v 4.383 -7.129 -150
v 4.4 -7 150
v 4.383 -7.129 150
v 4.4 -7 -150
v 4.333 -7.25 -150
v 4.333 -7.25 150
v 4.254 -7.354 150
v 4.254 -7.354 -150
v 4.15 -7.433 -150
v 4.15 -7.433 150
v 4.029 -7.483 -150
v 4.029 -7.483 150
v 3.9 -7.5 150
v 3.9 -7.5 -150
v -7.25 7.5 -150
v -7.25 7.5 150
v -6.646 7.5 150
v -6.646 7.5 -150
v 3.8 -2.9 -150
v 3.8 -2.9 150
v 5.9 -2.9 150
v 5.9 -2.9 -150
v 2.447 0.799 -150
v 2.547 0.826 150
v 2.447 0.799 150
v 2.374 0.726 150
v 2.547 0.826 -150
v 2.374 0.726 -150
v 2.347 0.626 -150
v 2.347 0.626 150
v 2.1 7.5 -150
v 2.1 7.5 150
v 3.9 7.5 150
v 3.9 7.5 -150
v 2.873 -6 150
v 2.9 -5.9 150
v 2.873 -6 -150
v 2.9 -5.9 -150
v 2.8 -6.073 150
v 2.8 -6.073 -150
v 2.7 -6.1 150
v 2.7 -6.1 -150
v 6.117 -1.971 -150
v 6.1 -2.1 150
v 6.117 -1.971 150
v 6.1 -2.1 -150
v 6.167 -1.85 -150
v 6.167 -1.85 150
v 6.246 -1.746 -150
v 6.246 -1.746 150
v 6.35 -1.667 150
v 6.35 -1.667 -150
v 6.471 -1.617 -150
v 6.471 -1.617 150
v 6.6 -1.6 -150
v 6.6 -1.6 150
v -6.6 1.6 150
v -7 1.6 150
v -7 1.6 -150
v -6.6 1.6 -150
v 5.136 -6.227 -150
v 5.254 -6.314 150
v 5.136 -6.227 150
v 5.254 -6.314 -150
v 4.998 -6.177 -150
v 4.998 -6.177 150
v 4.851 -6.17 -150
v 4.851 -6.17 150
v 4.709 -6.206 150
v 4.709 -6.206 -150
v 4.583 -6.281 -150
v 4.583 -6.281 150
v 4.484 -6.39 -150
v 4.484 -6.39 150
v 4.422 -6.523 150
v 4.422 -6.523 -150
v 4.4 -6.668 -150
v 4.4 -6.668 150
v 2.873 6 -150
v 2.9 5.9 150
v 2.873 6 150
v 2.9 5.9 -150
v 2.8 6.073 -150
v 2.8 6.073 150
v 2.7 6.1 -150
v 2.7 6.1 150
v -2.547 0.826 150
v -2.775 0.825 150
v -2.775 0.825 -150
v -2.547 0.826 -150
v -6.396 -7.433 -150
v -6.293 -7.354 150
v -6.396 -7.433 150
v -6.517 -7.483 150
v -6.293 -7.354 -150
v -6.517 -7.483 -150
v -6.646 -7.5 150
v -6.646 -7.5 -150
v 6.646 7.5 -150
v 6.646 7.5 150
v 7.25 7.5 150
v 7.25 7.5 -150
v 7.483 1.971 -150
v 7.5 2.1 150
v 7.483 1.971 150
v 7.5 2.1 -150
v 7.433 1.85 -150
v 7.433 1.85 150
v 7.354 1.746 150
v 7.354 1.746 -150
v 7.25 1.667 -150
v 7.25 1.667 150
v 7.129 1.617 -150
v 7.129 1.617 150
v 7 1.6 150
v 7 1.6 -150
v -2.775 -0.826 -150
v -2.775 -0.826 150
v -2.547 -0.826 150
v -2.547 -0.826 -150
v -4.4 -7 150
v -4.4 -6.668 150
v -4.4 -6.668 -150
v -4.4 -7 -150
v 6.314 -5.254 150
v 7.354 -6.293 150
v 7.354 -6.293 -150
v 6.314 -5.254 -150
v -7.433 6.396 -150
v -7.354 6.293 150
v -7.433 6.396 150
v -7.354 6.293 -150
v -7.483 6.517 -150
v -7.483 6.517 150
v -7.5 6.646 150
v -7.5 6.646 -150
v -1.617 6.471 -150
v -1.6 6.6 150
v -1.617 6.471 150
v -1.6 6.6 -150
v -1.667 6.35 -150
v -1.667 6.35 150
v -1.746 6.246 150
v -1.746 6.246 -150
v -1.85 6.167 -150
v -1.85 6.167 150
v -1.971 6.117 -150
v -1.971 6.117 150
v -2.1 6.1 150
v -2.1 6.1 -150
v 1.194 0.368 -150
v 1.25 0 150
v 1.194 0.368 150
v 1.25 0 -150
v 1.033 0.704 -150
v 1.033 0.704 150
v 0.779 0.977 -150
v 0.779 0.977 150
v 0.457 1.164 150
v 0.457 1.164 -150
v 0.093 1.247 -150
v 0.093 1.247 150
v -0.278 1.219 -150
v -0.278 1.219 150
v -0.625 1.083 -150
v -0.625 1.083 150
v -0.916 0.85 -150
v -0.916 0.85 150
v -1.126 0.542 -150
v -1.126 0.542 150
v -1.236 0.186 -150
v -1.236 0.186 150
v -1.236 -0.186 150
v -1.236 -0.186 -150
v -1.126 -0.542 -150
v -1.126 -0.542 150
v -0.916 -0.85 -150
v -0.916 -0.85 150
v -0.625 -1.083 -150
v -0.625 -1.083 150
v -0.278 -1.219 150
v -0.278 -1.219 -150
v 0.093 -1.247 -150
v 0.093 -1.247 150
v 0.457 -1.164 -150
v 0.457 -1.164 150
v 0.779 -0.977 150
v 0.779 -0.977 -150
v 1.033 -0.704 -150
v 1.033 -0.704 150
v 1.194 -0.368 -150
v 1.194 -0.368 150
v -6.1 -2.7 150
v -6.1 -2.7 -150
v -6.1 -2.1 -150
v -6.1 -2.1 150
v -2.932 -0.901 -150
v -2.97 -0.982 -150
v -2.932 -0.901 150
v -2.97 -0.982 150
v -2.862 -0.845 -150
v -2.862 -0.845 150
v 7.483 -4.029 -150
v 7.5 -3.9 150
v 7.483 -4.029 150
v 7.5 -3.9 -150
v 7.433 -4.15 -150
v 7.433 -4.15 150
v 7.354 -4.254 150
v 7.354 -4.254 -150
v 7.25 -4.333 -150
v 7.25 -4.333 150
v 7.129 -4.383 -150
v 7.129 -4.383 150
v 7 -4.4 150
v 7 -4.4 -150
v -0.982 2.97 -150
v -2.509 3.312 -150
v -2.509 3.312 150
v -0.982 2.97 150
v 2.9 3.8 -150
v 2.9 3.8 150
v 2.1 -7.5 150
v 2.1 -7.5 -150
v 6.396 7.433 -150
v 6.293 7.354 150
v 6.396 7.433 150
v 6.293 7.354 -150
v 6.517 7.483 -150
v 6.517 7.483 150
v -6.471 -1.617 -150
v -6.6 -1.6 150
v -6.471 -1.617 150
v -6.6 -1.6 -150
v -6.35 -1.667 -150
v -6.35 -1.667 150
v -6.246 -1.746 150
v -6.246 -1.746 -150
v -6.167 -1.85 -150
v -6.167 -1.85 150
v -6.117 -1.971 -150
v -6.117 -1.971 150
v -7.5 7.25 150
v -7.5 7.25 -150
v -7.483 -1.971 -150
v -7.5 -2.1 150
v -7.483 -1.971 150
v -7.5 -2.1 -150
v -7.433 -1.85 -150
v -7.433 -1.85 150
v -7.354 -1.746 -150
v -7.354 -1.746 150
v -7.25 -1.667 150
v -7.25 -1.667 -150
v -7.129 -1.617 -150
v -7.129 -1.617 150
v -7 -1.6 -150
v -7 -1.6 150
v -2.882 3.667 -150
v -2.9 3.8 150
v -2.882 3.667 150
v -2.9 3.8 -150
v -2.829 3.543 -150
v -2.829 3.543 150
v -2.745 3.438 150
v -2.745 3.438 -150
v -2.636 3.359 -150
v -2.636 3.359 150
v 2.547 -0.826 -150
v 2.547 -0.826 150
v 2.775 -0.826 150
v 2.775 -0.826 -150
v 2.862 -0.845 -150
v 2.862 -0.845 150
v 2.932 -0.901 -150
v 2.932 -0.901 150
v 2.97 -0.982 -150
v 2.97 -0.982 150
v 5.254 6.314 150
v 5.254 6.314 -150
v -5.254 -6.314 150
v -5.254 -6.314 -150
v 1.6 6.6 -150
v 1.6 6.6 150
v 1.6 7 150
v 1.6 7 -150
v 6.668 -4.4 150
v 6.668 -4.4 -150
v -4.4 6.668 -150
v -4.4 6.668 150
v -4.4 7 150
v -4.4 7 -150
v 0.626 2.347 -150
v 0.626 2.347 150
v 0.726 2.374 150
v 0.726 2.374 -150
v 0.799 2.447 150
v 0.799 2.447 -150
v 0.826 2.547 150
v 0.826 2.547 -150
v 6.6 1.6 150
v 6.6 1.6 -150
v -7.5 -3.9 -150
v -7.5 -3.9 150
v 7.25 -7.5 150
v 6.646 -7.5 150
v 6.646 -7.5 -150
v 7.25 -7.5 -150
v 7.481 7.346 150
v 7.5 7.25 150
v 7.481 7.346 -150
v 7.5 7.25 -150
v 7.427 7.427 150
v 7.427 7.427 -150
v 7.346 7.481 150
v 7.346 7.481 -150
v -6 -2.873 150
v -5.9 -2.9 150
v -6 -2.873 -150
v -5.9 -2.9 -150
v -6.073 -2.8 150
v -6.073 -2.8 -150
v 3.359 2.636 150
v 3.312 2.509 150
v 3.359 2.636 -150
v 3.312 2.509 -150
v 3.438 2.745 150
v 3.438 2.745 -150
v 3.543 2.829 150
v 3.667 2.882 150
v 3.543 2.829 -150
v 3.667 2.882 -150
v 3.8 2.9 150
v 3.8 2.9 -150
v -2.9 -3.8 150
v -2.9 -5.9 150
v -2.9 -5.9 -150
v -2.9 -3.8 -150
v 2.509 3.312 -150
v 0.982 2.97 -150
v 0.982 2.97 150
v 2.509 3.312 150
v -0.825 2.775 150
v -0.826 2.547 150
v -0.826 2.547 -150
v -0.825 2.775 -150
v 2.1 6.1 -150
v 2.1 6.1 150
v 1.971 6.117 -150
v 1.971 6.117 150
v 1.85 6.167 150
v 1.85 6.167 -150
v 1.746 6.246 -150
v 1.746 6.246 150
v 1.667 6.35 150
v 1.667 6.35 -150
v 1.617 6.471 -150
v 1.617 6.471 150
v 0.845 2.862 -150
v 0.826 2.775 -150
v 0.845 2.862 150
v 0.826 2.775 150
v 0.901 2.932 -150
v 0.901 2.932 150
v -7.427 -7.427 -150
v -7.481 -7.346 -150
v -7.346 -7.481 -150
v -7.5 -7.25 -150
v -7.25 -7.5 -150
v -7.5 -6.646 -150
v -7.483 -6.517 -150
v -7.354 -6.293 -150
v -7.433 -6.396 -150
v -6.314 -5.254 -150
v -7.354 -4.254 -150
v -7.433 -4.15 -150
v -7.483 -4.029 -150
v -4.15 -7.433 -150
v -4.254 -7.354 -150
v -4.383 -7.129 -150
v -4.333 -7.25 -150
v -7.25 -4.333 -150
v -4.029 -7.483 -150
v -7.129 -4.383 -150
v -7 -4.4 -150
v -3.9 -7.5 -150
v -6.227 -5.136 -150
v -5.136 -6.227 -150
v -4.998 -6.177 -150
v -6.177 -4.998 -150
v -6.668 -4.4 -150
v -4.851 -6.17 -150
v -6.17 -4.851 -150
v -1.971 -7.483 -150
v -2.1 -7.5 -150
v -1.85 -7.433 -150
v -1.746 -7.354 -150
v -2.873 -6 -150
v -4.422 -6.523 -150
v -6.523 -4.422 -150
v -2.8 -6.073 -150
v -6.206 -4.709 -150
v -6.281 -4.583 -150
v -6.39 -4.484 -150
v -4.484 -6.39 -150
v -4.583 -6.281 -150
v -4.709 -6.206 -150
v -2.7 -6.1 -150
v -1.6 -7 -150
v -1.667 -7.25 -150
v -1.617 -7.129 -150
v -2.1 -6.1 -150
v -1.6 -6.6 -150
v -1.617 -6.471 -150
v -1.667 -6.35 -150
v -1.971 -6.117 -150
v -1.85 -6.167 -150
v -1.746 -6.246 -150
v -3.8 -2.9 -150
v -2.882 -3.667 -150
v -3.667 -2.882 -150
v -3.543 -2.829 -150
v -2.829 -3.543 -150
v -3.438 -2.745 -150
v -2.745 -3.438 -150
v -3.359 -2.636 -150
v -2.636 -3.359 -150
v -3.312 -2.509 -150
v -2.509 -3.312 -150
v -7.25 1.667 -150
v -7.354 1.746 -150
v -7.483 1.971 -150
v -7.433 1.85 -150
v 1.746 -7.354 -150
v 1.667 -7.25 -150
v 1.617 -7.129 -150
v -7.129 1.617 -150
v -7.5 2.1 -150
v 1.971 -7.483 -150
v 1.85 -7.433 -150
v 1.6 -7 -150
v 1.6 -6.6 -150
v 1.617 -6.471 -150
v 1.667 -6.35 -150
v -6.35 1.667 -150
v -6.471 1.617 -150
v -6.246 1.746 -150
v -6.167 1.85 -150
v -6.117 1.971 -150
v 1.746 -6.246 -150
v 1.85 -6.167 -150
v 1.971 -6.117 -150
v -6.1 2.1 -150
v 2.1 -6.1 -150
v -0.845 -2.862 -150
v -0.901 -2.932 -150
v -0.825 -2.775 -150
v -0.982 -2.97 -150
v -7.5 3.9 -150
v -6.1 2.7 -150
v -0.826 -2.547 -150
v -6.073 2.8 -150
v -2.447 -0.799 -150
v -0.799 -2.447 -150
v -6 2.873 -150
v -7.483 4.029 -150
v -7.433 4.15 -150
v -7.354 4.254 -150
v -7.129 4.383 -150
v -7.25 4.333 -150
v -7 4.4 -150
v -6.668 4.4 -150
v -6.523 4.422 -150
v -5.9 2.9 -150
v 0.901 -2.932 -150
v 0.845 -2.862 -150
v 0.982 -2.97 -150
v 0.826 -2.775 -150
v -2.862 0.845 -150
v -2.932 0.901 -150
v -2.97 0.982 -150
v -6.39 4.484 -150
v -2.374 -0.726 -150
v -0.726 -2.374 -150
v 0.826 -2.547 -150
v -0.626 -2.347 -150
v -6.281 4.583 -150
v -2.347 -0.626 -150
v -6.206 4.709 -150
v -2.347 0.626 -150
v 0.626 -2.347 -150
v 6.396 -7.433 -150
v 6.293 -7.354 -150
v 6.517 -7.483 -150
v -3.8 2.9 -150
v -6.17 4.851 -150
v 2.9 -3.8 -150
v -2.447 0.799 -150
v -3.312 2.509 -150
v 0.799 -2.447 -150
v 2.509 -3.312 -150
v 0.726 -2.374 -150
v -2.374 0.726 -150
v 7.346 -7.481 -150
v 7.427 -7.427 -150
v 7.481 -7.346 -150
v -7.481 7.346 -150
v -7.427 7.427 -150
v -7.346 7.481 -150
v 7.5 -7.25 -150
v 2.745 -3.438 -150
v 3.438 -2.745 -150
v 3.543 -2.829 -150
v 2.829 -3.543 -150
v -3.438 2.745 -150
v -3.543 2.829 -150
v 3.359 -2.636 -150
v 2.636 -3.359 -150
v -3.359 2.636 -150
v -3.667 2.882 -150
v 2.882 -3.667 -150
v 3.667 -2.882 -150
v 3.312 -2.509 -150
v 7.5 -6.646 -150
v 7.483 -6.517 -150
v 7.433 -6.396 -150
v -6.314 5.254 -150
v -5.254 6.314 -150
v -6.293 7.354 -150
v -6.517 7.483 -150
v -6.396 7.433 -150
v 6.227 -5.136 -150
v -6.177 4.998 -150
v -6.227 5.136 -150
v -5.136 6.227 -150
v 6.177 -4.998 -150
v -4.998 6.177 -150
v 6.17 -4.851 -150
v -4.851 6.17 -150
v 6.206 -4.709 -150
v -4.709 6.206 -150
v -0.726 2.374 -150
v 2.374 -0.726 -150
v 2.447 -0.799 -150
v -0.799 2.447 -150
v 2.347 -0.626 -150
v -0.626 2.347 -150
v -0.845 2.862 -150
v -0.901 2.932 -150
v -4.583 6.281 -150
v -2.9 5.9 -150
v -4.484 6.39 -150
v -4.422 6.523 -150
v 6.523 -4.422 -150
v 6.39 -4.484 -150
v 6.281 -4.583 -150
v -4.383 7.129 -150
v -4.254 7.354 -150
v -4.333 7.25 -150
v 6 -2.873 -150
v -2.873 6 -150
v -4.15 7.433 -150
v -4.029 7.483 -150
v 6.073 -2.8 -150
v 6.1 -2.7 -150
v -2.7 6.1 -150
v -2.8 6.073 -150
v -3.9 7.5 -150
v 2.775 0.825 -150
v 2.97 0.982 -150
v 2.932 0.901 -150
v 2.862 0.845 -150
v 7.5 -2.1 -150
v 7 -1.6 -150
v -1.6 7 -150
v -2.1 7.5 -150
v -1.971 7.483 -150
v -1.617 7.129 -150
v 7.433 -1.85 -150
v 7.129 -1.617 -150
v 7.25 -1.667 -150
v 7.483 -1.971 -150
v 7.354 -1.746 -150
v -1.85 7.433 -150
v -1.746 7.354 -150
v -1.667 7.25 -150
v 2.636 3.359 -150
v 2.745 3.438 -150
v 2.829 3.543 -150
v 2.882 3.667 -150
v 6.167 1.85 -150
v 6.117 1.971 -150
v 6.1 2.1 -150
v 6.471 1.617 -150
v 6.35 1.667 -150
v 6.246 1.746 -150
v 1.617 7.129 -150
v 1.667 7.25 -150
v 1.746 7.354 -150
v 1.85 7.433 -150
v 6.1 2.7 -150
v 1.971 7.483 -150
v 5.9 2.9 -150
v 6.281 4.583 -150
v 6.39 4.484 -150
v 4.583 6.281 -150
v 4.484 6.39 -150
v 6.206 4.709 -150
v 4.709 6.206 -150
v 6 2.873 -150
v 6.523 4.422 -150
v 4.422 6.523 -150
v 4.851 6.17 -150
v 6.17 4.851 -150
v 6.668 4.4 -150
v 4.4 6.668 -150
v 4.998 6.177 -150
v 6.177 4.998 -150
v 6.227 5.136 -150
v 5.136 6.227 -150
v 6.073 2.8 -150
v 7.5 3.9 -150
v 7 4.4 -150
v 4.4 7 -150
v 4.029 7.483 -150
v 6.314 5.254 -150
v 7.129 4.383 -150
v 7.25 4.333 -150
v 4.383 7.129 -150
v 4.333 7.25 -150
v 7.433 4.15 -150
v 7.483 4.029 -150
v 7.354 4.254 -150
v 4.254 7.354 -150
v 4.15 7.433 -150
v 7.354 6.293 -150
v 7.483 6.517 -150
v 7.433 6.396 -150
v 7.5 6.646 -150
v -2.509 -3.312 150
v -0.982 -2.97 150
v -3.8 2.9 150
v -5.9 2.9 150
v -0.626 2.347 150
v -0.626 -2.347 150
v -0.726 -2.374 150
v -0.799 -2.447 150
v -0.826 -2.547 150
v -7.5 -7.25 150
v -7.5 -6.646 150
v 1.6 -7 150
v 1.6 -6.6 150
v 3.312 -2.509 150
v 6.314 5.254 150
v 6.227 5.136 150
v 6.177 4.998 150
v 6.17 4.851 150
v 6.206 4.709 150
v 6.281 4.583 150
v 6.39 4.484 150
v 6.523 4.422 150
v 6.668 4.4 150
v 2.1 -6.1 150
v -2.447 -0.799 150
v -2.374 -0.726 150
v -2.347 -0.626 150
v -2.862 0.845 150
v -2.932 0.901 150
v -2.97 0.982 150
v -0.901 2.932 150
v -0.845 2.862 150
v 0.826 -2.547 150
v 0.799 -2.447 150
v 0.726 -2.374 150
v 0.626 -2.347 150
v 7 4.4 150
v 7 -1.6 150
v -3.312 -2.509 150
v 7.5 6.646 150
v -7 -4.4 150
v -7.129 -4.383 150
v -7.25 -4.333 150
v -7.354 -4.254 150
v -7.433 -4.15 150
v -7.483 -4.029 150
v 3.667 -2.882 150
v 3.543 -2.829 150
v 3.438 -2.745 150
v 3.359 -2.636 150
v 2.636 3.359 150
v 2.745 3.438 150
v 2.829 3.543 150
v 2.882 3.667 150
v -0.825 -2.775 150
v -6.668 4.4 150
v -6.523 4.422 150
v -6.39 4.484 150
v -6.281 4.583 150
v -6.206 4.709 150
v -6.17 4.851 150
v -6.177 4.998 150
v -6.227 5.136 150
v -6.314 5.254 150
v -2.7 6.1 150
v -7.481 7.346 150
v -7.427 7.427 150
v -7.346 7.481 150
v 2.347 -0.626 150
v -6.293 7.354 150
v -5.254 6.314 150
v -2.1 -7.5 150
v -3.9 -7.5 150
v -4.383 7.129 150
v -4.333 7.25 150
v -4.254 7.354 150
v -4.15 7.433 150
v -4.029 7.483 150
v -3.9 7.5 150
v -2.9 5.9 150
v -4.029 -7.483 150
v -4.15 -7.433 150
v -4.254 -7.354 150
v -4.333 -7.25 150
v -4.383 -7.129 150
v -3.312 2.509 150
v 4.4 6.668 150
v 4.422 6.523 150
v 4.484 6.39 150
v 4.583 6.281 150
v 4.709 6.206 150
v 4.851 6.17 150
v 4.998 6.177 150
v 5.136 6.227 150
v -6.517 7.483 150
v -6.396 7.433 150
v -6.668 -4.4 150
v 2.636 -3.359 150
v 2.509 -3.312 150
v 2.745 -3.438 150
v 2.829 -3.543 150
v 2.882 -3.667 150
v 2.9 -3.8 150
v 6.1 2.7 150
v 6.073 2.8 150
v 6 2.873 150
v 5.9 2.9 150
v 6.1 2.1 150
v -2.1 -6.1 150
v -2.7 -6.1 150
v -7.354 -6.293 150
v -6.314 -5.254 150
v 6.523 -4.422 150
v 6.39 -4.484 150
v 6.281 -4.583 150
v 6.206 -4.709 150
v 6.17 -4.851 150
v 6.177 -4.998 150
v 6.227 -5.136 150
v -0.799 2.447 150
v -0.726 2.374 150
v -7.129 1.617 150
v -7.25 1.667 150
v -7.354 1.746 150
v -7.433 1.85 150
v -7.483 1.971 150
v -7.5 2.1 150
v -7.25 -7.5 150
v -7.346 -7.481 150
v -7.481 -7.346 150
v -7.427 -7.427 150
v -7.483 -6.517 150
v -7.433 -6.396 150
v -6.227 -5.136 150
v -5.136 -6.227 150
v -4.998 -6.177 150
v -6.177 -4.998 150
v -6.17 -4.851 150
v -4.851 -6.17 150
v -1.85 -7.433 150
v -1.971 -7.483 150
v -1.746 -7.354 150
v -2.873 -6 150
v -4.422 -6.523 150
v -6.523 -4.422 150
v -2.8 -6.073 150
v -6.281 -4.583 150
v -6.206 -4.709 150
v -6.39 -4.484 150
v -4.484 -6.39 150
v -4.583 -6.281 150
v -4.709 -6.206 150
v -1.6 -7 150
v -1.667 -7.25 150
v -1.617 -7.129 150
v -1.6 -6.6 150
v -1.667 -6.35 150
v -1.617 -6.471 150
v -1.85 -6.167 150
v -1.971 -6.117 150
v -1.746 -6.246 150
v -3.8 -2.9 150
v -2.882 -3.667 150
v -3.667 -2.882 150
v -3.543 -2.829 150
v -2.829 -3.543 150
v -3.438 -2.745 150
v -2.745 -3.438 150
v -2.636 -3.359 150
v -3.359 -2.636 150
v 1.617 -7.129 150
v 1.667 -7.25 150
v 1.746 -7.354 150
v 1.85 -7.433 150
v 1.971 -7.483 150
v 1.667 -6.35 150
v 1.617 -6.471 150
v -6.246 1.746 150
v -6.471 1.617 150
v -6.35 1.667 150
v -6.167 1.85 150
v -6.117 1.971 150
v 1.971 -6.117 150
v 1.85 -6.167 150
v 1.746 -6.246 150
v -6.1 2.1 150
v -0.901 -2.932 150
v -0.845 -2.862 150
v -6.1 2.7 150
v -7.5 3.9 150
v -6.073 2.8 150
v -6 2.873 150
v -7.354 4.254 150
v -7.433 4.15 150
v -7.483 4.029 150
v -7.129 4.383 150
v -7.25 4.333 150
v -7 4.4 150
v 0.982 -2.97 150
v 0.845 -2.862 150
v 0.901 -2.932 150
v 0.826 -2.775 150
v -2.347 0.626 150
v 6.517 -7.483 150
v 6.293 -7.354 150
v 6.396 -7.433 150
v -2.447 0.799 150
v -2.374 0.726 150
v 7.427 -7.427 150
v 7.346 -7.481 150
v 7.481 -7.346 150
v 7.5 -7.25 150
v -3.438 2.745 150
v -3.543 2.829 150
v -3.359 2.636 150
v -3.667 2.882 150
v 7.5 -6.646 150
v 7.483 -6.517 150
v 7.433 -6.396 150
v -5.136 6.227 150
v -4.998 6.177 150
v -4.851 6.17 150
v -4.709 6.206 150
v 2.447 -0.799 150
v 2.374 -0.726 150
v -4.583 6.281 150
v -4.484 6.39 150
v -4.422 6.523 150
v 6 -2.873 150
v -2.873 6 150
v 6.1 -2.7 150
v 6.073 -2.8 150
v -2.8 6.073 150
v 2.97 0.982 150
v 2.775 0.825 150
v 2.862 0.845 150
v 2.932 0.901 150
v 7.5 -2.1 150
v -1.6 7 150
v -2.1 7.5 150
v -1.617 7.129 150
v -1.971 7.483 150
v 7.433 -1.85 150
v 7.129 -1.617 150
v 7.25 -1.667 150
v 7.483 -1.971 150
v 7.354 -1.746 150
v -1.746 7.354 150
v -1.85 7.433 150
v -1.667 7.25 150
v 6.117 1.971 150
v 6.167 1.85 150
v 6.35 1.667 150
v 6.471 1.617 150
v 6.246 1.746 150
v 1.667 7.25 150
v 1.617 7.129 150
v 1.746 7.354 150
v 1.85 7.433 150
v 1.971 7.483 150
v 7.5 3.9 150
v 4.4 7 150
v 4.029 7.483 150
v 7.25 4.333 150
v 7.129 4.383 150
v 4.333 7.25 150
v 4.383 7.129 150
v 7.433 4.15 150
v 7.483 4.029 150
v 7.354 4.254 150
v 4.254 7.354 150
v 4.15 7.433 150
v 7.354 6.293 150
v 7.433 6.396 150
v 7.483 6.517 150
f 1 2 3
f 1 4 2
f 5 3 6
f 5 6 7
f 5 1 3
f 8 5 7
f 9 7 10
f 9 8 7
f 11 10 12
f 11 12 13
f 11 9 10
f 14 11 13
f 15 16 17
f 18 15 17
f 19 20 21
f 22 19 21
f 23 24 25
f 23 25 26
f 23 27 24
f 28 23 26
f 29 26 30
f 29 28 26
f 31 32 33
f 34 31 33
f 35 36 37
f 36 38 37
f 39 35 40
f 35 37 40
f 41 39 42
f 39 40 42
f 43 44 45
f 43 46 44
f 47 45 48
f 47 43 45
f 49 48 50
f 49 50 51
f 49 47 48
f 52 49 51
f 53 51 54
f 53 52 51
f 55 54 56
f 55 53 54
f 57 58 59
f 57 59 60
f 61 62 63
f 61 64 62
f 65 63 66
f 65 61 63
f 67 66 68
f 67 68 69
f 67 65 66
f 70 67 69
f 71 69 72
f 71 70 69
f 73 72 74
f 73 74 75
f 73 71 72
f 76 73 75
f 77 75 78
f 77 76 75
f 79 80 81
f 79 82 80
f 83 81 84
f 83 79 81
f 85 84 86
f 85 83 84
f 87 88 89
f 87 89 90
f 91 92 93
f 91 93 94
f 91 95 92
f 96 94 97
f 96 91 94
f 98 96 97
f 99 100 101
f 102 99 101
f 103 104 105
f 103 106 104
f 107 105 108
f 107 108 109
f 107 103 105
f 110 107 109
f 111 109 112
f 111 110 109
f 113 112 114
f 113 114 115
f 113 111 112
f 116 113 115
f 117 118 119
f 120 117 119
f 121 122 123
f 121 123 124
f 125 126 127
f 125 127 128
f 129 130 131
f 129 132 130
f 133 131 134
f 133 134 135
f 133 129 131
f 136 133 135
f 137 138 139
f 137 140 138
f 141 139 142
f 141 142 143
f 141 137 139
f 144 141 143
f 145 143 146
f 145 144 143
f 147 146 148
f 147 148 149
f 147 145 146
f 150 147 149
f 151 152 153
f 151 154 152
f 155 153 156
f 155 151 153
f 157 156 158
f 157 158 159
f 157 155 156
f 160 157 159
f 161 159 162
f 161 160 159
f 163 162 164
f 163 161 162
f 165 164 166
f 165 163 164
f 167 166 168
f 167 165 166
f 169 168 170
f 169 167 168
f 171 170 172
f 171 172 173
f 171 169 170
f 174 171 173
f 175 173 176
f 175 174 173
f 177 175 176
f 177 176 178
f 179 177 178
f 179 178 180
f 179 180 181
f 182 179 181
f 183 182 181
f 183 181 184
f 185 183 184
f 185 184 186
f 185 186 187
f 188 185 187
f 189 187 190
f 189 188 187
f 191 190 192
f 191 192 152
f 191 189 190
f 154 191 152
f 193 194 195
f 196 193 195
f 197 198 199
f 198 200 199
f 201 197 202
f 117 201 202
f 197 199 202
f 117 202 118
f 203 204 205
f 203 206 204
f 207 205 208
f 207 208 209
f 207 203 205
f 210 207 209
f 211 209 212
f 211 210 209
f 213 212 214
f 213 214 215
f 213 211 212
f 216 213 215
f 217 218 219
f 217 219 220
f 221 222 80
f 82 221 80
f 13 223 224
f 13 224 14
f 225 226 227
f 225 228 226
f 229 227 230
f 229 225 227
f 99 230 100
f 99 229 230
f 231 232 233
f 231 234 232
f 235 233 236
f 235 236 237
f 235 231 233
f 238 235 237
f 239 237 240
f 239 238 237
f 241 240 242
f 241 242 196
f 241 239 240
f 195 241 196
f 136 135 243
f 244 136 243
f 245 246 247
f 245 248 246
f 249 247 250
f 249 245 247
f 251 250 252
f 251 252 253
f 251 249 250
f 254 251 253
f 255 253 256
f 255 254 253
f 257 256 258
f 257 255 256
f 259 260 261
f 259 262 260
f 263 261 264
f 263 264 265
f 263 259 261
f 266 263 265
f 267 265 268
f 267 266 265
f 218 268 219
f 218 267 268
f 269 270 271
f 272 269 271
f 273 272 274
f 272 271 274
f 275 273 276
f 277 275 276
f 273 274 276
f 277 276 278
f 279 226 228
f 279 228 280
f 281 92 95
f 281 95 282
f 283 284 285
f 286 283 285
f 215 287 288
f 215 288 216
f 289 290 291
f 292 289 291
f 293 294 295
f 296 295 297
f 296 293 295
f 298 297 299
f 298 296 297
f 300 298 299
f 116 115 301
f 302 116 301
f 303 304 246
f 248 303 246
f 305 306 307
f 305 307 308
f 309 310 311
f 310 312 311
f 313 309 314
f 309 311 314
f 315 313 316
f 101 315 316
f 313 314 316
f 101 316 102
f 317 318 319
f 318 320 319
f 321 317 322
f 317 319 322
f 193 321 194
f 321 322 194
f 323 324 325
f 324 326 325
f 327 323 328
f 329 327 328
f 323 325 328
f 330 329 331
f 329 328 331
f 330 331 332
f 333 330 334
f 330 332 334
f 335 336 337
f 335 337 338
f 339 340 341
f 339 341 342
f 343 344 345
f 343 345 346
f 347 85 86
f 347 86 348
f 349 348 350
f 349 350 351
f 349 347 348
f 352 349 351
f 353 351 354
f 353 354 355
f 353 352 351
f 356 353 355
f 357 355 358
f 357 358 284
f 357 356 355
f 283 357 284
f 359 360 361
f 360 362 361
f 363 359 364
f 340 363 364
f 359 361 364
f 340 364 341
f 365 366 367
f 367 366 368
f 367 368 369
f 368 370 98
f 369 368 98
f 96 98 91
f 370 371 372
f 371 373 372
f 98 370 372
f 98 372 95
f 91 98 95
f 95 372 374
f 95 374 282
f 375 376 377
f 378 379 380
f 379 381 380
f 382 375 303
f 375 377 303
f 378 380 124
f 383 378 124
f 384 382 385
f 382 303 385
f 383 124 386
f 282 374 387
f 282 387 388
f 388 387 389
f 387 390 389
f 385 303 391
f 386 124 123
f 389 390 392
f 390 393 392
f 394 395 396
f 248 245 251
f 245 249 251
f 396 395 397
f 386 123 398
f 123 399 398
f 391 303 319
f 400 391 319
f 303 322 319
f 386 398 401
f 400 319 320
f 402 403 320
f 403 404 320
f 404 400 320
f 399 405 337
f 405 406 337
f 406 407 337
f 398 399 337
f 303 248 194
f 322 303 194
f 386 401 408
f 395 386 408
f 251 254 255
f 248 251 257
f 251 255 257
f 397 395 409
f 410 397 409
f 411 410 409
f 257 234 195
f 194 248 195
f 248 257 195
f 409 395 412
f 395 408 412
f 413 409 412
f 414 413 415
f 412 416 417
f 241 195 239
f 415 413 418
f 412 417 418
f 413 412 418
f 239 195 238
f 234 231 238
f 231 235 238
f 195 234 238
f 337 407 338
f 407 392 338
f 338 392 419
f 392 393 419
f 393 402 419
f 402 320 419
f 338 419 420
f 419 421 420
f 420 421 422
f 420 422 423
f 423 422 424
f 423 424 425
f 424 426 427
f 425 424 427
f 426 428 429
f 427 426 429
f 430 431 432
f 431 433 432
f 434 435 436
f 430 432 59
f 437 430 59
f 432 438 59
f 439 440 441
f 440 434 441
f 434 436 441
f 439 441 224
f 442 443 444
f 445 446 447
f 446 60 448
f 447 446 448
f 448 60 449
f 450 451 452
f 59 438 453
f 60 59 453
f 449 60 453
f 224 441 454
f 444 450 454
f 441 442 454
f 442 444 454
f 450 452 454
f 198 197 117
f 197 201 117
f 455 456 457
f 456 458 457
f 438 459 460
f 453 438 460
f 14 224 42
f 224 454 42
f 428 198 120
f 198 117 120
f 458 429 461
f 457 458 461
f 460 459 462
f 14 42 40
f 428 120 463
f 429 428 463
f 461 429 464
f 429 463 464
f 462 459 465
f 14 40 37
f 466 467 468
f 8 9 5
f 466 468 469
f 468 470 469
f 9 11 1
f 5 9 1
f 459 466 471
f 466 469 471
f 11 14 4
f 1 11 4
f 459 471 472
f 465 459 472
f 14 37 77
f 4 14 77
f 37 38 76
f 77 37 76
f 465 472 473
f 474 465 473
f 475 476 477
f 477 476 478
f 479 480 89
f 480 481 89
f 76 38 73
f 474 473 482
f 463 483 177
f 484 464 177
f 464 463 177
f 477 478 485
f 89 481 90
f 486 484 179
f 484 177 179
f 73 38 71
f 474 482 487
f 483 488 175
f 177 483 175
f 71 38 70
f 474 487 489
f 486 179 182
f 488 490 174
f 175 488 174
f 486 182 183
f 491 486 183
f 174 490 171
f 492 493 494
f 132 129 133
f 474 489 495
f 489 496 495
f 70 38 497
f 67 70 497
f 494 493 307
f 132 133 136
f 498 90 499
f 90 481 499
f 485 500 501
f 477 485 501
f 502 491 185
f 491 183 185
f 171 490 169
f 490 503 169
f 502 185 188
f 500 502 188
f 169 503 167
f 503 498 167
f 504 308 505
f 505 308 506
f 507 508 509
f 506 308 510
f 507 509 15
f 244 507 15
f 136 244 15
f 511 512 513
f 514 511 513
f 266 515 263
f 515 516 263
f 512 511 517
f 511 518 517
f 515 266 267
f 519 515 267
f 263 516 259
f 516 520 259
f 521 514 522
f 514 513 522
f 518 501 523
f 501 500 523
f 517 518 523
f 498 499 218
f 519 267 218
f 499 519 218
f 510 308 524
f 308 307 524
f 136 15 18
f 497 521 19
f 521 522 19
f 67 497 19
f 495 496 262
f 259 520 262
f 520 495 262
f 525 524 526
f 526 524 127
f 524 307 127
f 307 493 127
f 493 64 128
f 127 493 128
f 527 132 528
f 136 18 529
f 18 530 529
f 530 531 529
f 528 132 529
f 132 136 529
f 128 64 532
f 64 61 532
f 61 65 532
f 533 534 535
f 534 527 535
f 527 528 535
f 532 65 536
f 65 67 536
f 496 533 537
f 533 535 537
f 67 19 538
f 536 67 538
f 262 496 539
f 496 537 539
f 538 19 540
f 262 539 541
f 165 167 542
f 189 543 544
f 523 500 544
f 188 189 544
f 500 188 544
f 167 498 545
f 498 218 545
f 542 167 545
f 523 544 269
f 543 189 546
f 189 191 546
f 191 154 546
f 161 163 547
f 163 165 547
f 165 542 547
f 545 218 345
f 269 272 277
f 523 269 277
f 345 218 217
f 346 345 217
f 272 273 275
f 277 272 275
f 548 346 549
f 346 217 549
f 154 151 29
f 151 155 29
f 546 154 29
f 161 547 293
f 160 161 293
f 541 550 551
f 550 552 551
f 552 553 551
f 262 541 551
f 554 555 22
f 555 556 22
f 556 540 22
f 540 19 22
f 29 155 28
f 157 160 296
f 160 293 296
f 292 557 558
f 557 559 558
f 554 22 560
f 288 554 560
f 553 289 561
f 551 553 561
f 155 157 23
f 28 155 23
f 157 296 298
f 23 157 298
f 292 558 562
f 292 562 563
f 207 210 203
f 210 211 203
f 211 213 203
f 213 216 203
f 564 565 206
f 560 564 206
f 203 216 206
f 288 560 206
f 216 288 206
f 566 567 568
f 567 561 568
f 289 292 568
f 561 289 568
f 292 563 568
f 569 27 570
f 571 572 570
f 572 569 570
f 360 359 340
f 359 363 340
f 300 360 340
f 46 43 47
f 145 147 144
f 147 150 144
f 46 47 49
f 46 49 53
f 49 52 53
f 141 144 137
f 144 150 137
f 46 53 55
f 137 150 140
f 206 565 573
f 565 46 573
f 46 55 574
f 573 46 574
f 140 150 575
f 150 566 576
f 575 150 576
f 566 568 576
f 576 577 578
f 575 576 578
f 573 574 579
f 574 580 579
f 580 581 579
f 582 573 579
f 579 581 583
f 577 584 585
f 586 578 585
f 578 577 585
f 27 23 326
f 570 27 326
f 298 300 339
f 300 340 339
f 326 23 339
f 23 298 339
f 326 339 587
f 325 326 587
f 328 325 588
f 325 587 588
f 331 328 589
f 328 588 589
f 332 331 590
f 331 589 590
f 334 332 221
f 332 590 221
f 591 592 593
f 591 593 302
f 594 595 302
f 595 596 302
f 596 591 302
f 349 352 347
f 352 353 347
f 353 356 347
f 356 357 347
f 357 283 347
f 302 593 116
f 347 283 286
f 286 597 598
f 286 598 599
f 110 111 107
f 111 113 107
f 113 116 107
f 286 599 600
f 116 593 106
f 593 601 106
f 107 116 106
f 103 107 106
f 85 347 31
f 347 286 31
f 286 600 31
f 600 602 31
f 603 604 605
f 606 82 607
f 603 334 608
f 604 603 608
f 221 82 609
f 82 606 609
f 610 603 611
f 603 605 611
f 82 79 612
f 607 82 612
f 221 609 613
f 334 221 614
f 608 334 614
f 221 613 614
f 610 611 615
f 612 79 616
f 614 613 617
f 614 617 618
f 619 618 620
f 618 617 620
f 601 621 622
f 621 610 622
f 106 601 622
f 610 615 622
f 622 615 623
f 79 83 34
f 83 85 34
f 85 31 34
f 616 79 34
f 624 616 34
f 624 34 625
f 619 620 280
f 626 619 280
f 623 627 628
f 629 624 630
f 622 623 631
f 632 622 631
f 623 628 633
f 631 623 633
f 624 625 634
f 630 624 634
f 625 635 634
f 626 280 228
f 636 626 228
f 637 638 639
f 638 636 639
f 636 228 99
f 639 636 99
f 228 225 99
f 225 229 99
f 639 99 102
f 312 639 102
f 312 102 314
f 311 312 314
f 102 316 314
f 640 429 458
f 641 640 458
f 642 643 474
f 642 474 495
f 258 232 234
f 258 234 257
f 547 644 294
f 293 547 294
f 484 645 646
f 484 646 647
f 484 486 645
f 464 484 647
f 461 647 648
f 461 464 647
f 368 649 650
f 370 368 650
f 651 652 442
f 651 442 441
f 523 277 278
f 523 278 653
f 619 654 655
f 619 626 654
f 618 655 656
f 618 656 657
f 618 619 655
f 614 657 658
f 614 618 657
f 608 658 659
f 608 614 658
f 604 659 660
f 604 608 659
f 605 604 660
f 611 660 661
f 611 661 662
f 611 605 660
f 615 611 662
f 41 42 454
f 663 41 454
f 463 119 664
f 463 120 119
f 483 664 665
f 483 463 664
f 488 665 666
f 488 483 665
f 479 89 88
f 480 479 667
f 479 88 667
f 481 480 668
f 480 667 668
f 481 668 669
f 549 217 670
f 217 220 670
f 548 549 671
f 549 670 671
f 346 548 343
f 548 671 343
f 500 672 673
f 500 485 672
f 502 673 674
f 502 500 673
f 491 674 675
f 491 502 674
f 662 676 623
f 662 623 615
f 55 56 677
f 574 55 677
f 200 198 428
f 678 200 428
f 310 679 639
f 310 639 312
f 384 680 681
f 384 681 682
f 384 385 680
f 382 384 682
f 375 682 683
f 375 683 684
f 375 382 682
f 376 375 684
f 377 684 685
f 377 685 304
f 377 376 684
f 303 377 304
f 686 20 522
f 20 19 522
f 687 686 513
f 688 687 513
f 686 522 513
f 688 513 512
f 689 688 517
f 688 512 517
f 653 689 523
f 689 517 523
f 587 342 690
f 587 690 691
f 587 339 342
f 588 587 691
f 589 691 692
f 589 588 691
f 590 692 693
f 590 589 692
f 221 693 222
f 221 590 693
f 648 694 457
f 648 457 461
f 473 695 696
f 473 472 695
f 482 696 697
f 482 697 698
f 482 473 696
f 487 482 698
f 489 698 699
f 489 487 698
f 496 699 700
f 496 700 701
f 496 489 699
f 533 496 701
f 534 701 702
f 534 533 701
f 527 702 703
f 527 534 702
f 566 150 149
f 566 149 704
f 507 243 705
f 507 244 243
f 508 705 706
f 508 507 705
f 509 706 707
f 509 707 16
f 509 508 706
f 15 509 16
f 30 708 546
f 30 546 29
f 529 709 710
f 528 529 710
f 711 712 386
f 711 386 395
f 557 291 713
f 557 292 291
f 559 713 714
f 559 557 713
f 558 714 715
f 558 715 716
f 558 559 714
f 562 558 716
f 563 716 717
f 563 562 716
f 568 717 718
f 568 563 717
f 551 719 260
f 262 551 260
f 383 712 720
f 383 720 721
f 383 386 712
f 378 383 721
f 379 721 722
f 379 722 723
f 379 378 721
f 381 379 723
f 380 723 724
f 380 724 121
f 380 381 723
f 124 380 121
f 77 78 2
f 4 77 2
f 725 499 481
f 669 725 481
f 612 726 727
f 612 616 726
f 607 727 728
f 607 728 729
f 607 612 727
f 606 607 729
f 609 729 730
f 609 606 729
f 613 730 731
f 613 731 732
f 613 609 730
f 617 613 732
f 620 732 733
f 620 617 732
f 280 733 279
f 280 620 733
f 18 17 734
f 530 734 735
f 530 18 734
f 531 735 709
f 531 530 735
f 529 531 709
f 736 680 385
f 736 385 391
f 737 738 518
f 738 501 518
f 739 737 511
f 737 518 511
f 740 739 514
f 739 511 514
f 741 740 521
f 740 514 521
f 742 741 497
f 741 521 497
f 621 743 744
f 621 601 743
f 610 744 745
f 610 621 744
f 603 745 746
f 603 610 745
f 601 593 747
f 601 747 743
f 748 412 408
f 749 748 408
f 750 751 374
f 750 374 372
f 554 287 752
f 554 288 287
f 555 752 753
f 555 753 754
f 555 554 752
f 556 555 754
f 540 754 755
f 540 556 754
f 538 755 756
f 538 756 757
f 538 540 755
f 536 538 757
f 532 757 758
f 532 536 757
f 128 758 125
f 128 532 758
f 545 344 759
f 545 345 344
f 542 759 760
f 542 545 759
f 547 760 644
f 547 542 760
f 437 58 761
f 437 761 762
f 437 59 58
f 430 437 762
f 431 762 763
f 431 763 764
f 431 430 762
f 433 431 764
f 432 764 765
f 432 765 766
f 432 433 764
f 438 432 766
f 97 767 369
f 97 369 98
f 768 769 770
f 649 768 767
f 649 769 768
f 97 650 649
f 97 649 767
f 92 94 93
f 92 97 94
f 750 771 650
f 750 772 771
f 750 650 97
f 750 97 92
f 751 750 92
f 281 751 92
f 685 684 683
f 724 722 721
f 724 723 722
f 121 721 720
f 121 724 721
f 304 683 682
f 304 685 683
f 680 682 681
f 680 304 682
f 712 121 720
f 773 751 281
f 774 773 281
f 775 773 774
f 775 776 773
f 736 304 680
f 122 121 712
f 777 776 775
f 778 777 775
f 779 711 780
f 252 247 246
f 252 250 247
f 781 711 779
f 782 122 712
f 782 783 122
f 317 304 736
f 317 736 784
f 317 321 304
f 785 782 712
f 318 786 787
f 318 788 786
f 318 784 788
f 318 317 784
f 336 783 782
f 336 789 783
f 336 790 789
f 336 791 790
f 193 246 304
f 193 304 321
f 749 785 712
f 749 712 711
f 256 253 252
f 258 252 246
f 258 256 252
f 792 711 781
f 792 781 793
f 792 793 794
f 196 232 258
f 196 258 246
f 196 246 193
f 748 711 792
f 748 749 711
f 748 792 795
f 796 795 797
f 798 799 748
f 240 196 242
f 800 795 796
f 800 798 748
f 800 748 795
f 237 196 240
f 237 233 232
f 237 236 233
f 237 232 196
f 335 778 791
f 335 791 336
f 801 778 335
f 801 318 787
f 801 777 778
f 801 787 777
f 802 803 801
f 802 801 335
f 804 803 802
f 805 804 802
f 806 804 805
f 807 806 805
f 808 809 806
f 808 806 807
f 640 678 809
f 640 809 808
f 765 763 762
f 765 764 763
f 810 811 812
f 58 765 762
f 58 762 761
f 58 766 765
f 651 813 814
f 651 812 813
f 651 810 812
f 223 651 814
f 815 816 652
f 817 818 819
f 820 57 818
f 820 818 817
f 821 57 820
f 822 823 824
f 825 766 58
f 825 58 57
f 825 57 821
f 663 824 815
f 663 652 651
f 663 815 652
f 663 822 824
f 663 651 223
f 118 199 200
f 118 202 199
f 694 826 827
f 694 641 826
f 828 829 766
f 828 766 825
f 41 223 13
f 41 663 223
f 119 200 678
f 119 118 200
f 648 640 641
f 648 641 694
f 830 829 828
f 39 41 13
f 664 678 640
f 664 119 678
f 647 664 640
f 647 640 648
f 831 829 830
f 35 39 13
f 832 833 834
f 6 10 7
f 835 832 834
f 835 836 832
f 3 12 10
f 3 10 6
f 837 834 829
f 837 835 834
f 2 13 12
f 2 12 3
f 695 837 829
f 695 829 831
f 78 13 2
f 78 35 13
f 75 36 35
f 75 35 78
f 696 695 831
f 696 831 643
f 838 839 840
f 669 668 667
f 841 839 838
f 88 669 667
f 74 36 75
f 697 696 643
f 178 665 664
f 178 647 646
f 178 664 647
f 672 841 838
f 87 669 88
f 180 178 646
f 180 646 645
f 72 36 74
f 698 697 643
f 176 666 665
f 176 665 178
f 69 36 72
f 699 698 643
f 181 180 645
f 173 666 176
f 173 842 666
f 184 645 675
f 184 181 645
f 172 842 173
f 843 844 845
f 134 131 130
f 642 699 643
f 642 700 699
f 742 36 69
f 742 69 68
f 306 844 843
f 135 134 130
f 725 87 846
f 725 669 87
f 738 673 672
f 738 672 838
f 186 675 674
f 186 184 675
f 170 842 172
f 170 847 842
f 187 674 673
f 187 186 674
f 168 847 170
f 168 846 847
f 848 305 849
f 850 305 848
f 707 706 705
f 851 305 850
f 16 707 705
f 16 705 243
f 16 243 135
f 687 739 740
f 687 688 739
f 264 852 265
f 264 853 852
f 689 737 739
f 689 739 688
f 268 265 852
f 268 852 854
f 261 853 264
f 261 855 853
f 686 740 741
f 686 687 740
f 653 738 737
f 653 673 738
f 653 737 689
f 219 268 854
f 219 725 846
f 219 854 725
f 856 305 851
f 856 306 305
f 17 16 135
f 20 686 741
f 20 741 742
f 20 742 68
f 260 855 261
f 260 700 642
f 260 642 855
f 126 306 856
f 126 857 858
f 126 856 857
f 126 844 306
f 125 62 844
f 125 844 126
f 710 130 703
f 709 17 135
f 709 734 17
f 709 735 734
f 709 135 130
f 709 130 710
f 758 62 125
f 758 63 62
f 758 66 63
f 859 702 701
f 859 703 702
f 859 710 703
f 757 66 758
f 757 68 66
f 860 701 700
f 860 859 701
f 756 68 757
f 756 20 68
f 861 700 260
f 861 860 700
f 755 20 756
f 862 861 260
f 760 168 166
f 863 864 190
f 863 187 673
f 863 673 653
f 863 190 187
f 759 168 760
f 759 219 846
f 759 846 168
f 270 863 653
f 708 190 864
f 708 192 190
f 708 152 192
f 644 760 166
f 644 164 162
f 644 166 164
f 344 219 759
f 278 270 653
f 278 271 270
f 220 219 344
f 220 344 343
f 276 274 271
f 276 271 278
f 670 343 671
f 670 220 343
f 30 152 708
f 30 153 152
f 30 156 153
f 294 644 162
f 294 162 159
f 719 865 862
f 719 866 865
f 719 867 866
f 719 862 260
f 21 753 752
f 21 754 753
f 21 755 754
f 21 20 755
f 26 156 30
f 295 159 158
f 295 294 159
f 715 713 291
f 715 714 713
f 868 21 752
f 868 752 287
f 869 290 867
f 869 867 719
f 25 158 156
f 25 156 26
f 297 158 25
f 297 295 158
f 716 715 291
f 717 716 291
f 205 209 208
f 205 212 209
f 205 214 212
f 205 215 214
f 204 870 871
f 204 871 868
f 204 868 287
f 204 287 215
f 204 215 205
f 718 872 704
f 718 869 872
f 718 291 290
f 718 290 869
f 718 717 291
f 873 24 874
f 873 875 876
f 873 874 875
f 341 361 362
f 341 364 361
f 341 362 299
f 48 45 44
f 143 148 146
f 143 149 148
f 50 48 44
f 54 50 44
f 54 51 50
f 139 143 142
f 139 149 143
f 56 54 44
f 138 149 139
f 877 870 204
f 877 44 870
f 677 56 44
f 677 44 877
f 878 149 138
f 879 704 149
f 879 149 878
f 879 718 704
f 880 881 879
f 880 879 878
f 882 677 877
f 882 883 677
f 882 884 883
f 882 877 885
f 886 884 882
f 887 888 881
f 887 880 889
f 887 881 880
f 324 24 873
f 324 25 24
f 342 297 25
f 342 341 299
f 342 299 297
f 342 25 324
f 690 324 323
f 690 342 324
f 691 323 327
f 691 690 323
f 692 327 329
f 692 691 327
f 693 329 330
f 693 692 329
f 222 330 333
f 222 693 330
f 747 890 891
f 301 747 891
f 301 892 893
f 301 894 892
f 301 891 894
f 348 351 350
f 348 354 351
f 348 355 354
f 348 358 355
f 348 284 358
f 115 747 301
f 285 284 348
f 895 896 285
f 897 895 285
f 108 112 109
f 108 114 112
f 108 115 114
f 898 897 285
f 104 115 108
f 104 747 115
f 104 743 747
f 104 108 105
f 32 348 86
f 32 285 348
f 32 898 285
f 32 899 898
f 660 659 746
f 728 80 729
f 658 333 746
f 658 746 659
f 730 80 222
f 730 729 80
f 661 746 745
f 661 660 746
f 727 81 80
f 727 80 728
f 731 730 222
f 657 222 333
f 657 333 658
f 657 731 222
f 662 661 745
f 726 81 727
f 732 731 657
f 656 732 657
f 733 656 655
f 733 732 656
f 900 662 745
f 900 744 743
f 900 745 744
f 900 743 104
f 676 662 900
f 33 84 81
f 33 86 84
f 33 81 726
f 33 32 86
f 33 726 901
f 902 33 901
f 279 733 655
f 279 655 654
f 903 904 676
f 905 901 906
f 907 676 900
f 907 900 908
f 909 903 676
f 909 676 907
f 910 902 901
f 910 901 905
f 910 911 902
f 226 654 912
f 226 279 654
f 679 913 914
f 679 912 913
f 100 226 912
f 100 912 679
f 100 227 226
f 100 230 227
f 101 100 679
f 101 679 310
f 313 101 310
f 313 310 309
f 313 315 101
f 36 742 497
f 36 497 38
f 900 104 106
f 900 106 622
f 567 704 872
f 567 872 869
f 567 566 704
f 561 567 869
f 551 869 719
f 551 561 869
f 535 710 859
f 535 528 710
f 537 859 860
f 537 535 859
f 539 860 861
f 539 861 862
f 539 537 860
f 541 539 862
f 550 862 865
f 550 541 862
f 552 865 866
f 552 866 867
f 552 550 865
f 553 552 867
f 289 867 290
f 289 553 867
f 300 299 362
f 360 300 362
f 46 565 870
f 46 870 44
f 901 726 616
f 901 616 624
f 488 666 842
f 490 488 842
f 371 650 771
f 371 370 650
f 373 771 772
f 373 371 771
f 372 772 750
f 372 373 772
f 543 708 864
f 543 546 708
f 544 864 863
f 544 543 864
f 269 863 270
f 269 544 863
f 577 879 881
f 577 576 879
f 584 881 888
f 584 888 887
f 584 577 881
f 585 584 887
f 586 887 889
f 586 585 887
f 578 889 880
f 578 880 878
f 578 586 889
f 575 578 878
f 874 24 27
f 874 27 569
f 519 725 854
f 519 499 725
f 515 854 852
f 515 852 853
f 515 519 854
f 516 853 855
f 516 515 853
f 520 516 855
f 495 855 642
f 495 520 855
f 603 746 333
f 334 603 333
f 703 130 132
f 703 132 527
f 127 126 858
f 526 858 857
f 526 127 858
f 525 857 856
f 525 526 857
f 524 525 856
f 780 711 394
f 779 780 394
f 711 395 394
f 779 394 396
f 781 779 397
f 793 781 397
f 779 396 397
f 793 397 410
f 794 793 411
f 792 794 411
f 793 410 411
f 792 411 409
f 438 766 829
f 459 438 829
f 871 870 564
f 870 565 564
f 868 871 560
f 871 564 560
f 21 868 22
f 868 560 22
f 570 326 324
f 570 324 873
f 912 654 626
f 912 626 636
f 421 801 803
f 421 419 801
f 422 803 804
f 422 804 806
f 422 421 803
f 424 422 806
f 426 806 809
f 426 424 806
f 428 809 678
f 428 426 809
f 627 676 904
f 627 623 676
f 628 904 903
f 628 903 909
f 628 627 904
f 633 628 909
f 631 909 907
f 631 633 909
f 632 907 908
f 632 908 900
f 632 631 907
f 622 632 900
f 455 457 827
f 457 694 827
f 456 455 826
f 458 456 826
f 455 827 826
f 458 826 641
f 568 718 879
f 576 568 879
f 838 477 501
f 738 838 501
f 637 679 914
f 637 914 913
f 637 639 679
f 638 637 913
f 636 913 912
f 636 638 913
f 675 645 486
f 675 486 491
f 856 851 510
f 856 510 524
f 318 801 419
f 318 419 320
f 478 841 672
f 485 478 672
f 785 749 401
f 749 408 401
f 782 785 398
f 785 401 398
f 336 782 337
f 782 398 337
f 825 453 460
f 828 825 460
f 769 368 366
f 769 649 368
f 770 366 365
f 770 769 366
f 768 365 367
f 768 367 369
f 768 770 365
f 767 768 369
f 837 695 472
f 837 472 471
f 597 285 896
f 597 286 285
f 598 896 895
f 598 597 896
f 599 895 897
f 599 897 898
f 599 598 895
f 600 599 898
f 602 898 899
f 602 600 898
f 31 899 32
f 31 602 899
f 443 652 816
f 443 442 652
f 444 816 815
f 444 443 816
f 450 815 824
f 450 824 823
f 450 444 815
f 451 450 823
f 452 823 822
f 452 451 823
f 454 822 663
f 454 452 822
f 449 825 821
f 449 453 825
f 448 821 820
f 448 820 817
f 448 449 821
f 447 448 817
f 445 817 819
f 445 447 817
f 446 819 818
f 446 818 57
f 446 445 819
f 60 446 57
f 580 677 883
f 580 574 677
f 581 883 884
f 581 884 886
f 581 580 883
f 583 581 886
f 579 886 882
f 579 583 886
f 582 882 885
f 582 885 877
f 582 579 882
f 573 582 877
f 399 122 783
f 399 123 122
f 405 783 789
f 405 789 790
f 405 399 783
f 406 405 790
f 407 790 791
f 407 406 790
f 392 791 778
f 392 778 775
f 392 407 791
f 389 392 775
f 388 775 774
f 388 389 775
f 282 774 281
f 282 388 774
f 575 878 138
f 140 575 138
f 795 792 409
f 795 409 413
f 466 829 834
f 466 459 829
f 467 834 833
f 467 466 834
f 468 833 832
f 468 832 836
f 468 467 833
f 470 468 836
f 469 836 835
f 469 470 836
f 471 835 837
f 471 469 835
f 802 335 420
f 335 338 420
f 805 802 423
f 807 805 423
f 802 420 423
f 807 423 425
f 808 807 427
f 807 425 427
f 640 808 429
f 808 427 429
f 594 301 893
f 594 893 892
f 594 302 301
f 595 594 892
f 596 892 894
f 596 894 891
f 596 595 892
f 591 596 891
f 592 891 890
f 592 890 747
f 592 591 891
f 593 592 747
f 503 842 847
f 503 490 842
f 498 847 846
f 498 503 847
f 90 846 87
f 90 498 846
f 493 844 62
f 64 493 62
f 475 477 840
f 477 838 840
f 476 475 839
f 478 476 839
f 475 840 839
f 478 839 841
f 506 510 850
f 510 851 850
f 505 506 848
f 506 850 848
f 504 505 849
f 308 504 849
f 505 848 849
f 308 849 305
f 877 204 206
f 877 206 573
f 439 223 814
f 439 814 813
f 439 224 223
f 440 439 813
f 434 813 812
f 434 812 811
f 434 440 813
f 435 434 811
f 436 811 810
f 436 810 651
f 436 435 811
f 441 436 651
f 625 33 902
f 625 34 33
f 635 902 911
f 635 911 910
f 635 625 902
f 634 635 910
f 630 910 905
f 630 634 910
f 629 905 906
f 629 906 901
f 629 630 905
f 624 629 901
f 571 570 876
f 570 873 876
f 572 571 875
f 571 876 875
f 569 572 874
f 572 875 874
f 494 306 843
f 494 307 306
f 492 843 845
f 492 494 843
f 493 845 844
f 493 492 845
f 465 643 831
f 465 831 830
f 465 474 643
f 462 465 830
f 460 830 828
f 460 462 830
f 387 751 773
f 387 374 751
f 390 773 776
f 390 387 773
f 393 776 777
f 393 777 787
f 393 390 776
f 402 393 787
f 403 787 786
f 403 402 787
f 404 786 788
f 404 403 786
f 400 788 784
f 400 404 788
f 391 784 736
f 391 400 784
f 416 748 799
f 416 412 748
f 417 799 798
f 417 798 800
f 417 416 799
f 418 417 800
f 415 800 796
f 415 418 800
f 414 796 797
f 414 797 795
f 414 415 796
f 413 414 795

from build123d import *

# Parameters (mm, degrees)
SKETCH1_W           = 15
SKETCH1_H           = 15
SKETCH1_R           = 1.25
CHANGE_LENGTH_DEPTH = 150
FILLET1_R           = 0.25
CUT_EXTRUDE1_DEPTH  = 301.187441443
CUT_EXTRUDE3_DEPTH  = 301.187441443
FILLET3_R           = 0.5
FILLET4_R           = 0.5
FILLET5_R           = 3
FILLET6_R           = 0.2
CUT_EXTRUDE4_DEPTH  = 301.187441443
FILLET8_R           = 0.5
SKETCH6_W           = 5.1529354
SKETCH6_H           = 1.651
SKETCH6_W_2         = 1.651
SKETCH6_H_2         = 5.1529354
CUT_EXTRUDE5_DEPTH  = 301.187441443
FILLET10_R          = 0.2


with BuildPart() as part:
    # Sketch1 → Change length (new, symmetric)
    with BuildSketch(Plane.XY):
        Rectangle(SKETCH1_W, SKETCH1_H)
        Circle(SKETCH1_R, mode=Mode.SUBTRACT)
    extrude(amount=CHANGE_LENGTH_DEPTH, both=True)

    # Fillet1
    fillet1_edges = [part.edges().sort_by_distance(p)[0] for p in [
        (7.5, -7.5, 0),
        (-7.5, -7.5, 0),
        (-7.5, 7.5, 0),
        (7.5, 7.5, 0),
    ]]
    fillet(fillet1_edges, radius=FILLET1_R)

    # Sketch2 → Cut-Extrude1 (cut, through all)
    with BuildSketch(Plane.XY.offset(150)):
        Polygon((-7.5, 1.6), (-6.1, 1.6), (-6.1, 2.9), (-3.4, 2.9), (-3.4, -2.9), (-6.1, -2.9), (-6.1, -1.6), (-7.5, -1.6), align=None)
        Polygon((2.9, 6.1), (1.6, 6.1), (1.6, 7.5), (-1.6, 7.5), (-1.6, 6.1), (-2.9, 6.1), (-2.9, 3.4), (2.9, 3.4), align=None)
        Polygon((-1.6, -7.5), (-1.6, -6.1), (-2.9, -6.1), (-2.9, -3.4), (2.9, -3.4), (2.9, -6.1), (1.6, -6.1), (1.6, -7.5), align=None)
        Polygon((6.1, -2.9), (6.1, -1.6), (7.5, -1.6), (7.5, 1.6), (6.1, 1.6), (6.1, 2.9), (3.4, 2.9), (3.4, -2.9), align=None)
    extrude(amount=-CUT_EXTRUDE1_DEPTH, mode=Mode.SUBTRACT)

    # Sketch4 → Cut-Extrude3 (cut, through all)
    with BuildSketch(Plane.XY.offset(150)):
        Polygon((-3.4, 2.9), (-2.75, 0), (-3.4, -2.9), align=None)
        Polygon((-2.9, 3.4), (0, 2.75), (2.9, 3.4), align=None)
        Polygon((3.4, 2.9), (2.75, 0), (3.4, -2.9), align=None)
        Polygon((-2.9, -3.4), (0, -2.75), (2.9, -3.4), align=None)
    extrude(amount=-CUT_EXTRUDE3_DEPTH, mode=Mode.SUBTRACT)

    # Fillet3
    fillet3_edges = [part.edges().sort_by_distance(p)[0] for p in [
        (1.6, -7.5, 0),
        (-1.6, -7.5, 0),
        (-1.6, -6.1, 0),
        (1.6, -6.1, 0),
        (6.1, 1.6, 0),
        (7.5, 1.6, 0),
        (7.5, -1.6, 0),
        (6.1, -1.6, 0),
        (-7.5, -1.6, 0),
        (-7.5, 1.6, 0),
        (-6.1, 1.6, 0),
        (-6.1, -1.6, 0),
        (-1.6, 6.1, 0),
        (-1.6, 7.5, 0),
        (1.6, 7.5, 0),
        (1.6, 6.1, 0),
    ]]
    fillet(fillet3_edges, radius=FILLET3_R)

    # Fillet4
    fillet4_edges = [part.edges().sort_by_distance(p)[0] for p in [
        (-2.9, -3.4, 0),
        (2.9, -3.4, 0),
        (3.4, -2.9, 0),
        (3.4, 2.9, 0),
        (-3.4, 2.9, 0),
        (-3.4, -2.9, 0),
        (2.9, 3.4, 0),
        (-2.9, 3.4, 0),
    ]]
    fillet(fillet4_edges, radius=FILLET4_R)

    # Fillet5
    fillet5_edges = [part.edges().sort_by_distance(p)[0] for p in [
        (-2.75, 0, 0),
        (0, 2.75, 0),
        (2.75, 0, 0),
        (0, -2.75, 0),
    ]]
    fillet(fillet5_edges, radius=FILLET5_R)

    # Fillet6
    fillet6_edges = [part.edges().sort_by_distance(p)[0] for p in [
        (-2.9, -6.1, 0),
        (2.9, -6.1, 0),
        (6.1, -2.9, 0),
        (6.1, 2.9, 0),
        (-6.1, 2.9, 0),
        (-6.1, -2.9, 0),
        (2.9, 6.1, 0),
        (-2.9, 6.1, 0),
    ]]
    fillet(fillet6_edges, radius=FILLET6_R)

    # Sketch5 → Cut-Extrude4 (cut, through all)
    with BuildSketch(Plane.XY.offset(150)):
        Polygon((-7.5, 6.439339828), (-5.460660172, 4.4), (-7.5, 4.4), align=None)
        Polygon((-6.439339828, 7.5), (-4.4, 5.460660172), (-4.4, 7.5), align=None)
        Polygon((4.4, 7.5), (6.439339828, 7.5), (4.4, 5.460660172), align=None)
        Polygon((7.5, 6.439339828), (7.5, 4.4), (5.460660172, 4.4), align=None)
        Polygon((7.5, -6.439339828), (5.460660172, -4.4), (7.5, -4.4), align=None)
        Polygon((6.439339828, -7.5), (4.4, -5.460660172), (4.4, -7.5), align=None)
        Polygon((-4.4, -7.5), (-6.439339828, -7.5), (-4.4, -5.460660172), align=None)
        Polygon((-7.5, -6.439339828), (-7.5, -4.4), (-5.460660172, -4.4), align=None)
    extrude(amount=-CUT_EXTRUDE4_DEPTH, mode=Mode.SUBTRACT)

    # Fillet8
    fillet8_edges = [part.edges().sort_by_distance(p)[0] for p in [
        (-7.5, 4.4, 0),
        (-7.5, 6.439339828, 0),
        (-5.460660172, 4.4, 0),
        (7.5, -4.4, 0),
        (7.5, -6.439339828, 0),
        (5.460660172, -4.4, 0),
        (5.460660172, 4.4, 0),
        (7.5, 6.439339828, 0),
        (7.5, 4.4, 0),
        (-4.4, 7.5, 0),
        (-4.4, 5.460660172, 0),
        (-6.439339828, 7.5, 0),
        (-5.460660172, -4.4, 0),
        (-7.5, -6.439339828, 0),
        (-7.5, -4.4, 0),
        (4.4, 5.460660172, 0),
        (4.4, 7.5, 0),
        (6.439339828, 7.5, 0),
        (6.439339828, -7.5, 0),
        (4.4, -7.5, 0),
        (4.4, -5.460660172, 0),
        (-6.439339828, -7.5, 0),
        (-4.4, -5.460660172, 0),
        (-4.4, -7.5, 0),
    ]]
    fillet(fillet8_edges, radius=FILLET8_R)

    # Sketch6 → Cut-Extrude5 (cut, through all)
    with BuildSketch(Plane.XY.offset(150)):
        with Locations((4.9235323, 0)):
            Rectangle(SKETCH6_W, SKETCH6_H)
        with Locations((0, -4.9235323)):
            Rectangle(SKETCH6_W_2, SKETCH6_H_2)
        with Locations((-4.9235323, 0)):
            Rectangle(SKETCH6_W, SKETCH6_H)
        with Locations((0, 4.9235323)):
            Rectangle(SKETCH6_W_2, SKETCH6_H_2)
    extrude(amount=-CUT_EXTRUDE5_DEPTH, mode=Mode.SUBTRACT)

    # Fillet10
    fillet10_edges = [part.edges().sort_by_distance(p)[0] for p in [
        (0.8255, -2.935025862, 0),
        (-0.8255, -2.935025862, 0),
        (0.8255, -2.3470646, 0),
        (-0.8255, -2.3470646, 0),
        (2.935025862, 0.8255, 0),
        (2.935025862, -0.8255, 0),
        (2.3470646, 0.8255, 0),
        (2.3470646, -0.8255, 0),
        (-2.935025862, -0.8255, 0),
        (-2.935025862, 0.8255, 0),
        (-2.3470646, -0.8255, 0),
        (-2.3470646, 0.8255, 0),
        (-0.8255, 2.935025862, 0),
        (0.8255, 2.935025862, 0),
        (-0.8255, 2.3470646, 0),
        (0.8255, 2.3470646, 0),
    ]]
    fillet(fillet10_edges, radius=FILLET10_R)


solid = part.part
